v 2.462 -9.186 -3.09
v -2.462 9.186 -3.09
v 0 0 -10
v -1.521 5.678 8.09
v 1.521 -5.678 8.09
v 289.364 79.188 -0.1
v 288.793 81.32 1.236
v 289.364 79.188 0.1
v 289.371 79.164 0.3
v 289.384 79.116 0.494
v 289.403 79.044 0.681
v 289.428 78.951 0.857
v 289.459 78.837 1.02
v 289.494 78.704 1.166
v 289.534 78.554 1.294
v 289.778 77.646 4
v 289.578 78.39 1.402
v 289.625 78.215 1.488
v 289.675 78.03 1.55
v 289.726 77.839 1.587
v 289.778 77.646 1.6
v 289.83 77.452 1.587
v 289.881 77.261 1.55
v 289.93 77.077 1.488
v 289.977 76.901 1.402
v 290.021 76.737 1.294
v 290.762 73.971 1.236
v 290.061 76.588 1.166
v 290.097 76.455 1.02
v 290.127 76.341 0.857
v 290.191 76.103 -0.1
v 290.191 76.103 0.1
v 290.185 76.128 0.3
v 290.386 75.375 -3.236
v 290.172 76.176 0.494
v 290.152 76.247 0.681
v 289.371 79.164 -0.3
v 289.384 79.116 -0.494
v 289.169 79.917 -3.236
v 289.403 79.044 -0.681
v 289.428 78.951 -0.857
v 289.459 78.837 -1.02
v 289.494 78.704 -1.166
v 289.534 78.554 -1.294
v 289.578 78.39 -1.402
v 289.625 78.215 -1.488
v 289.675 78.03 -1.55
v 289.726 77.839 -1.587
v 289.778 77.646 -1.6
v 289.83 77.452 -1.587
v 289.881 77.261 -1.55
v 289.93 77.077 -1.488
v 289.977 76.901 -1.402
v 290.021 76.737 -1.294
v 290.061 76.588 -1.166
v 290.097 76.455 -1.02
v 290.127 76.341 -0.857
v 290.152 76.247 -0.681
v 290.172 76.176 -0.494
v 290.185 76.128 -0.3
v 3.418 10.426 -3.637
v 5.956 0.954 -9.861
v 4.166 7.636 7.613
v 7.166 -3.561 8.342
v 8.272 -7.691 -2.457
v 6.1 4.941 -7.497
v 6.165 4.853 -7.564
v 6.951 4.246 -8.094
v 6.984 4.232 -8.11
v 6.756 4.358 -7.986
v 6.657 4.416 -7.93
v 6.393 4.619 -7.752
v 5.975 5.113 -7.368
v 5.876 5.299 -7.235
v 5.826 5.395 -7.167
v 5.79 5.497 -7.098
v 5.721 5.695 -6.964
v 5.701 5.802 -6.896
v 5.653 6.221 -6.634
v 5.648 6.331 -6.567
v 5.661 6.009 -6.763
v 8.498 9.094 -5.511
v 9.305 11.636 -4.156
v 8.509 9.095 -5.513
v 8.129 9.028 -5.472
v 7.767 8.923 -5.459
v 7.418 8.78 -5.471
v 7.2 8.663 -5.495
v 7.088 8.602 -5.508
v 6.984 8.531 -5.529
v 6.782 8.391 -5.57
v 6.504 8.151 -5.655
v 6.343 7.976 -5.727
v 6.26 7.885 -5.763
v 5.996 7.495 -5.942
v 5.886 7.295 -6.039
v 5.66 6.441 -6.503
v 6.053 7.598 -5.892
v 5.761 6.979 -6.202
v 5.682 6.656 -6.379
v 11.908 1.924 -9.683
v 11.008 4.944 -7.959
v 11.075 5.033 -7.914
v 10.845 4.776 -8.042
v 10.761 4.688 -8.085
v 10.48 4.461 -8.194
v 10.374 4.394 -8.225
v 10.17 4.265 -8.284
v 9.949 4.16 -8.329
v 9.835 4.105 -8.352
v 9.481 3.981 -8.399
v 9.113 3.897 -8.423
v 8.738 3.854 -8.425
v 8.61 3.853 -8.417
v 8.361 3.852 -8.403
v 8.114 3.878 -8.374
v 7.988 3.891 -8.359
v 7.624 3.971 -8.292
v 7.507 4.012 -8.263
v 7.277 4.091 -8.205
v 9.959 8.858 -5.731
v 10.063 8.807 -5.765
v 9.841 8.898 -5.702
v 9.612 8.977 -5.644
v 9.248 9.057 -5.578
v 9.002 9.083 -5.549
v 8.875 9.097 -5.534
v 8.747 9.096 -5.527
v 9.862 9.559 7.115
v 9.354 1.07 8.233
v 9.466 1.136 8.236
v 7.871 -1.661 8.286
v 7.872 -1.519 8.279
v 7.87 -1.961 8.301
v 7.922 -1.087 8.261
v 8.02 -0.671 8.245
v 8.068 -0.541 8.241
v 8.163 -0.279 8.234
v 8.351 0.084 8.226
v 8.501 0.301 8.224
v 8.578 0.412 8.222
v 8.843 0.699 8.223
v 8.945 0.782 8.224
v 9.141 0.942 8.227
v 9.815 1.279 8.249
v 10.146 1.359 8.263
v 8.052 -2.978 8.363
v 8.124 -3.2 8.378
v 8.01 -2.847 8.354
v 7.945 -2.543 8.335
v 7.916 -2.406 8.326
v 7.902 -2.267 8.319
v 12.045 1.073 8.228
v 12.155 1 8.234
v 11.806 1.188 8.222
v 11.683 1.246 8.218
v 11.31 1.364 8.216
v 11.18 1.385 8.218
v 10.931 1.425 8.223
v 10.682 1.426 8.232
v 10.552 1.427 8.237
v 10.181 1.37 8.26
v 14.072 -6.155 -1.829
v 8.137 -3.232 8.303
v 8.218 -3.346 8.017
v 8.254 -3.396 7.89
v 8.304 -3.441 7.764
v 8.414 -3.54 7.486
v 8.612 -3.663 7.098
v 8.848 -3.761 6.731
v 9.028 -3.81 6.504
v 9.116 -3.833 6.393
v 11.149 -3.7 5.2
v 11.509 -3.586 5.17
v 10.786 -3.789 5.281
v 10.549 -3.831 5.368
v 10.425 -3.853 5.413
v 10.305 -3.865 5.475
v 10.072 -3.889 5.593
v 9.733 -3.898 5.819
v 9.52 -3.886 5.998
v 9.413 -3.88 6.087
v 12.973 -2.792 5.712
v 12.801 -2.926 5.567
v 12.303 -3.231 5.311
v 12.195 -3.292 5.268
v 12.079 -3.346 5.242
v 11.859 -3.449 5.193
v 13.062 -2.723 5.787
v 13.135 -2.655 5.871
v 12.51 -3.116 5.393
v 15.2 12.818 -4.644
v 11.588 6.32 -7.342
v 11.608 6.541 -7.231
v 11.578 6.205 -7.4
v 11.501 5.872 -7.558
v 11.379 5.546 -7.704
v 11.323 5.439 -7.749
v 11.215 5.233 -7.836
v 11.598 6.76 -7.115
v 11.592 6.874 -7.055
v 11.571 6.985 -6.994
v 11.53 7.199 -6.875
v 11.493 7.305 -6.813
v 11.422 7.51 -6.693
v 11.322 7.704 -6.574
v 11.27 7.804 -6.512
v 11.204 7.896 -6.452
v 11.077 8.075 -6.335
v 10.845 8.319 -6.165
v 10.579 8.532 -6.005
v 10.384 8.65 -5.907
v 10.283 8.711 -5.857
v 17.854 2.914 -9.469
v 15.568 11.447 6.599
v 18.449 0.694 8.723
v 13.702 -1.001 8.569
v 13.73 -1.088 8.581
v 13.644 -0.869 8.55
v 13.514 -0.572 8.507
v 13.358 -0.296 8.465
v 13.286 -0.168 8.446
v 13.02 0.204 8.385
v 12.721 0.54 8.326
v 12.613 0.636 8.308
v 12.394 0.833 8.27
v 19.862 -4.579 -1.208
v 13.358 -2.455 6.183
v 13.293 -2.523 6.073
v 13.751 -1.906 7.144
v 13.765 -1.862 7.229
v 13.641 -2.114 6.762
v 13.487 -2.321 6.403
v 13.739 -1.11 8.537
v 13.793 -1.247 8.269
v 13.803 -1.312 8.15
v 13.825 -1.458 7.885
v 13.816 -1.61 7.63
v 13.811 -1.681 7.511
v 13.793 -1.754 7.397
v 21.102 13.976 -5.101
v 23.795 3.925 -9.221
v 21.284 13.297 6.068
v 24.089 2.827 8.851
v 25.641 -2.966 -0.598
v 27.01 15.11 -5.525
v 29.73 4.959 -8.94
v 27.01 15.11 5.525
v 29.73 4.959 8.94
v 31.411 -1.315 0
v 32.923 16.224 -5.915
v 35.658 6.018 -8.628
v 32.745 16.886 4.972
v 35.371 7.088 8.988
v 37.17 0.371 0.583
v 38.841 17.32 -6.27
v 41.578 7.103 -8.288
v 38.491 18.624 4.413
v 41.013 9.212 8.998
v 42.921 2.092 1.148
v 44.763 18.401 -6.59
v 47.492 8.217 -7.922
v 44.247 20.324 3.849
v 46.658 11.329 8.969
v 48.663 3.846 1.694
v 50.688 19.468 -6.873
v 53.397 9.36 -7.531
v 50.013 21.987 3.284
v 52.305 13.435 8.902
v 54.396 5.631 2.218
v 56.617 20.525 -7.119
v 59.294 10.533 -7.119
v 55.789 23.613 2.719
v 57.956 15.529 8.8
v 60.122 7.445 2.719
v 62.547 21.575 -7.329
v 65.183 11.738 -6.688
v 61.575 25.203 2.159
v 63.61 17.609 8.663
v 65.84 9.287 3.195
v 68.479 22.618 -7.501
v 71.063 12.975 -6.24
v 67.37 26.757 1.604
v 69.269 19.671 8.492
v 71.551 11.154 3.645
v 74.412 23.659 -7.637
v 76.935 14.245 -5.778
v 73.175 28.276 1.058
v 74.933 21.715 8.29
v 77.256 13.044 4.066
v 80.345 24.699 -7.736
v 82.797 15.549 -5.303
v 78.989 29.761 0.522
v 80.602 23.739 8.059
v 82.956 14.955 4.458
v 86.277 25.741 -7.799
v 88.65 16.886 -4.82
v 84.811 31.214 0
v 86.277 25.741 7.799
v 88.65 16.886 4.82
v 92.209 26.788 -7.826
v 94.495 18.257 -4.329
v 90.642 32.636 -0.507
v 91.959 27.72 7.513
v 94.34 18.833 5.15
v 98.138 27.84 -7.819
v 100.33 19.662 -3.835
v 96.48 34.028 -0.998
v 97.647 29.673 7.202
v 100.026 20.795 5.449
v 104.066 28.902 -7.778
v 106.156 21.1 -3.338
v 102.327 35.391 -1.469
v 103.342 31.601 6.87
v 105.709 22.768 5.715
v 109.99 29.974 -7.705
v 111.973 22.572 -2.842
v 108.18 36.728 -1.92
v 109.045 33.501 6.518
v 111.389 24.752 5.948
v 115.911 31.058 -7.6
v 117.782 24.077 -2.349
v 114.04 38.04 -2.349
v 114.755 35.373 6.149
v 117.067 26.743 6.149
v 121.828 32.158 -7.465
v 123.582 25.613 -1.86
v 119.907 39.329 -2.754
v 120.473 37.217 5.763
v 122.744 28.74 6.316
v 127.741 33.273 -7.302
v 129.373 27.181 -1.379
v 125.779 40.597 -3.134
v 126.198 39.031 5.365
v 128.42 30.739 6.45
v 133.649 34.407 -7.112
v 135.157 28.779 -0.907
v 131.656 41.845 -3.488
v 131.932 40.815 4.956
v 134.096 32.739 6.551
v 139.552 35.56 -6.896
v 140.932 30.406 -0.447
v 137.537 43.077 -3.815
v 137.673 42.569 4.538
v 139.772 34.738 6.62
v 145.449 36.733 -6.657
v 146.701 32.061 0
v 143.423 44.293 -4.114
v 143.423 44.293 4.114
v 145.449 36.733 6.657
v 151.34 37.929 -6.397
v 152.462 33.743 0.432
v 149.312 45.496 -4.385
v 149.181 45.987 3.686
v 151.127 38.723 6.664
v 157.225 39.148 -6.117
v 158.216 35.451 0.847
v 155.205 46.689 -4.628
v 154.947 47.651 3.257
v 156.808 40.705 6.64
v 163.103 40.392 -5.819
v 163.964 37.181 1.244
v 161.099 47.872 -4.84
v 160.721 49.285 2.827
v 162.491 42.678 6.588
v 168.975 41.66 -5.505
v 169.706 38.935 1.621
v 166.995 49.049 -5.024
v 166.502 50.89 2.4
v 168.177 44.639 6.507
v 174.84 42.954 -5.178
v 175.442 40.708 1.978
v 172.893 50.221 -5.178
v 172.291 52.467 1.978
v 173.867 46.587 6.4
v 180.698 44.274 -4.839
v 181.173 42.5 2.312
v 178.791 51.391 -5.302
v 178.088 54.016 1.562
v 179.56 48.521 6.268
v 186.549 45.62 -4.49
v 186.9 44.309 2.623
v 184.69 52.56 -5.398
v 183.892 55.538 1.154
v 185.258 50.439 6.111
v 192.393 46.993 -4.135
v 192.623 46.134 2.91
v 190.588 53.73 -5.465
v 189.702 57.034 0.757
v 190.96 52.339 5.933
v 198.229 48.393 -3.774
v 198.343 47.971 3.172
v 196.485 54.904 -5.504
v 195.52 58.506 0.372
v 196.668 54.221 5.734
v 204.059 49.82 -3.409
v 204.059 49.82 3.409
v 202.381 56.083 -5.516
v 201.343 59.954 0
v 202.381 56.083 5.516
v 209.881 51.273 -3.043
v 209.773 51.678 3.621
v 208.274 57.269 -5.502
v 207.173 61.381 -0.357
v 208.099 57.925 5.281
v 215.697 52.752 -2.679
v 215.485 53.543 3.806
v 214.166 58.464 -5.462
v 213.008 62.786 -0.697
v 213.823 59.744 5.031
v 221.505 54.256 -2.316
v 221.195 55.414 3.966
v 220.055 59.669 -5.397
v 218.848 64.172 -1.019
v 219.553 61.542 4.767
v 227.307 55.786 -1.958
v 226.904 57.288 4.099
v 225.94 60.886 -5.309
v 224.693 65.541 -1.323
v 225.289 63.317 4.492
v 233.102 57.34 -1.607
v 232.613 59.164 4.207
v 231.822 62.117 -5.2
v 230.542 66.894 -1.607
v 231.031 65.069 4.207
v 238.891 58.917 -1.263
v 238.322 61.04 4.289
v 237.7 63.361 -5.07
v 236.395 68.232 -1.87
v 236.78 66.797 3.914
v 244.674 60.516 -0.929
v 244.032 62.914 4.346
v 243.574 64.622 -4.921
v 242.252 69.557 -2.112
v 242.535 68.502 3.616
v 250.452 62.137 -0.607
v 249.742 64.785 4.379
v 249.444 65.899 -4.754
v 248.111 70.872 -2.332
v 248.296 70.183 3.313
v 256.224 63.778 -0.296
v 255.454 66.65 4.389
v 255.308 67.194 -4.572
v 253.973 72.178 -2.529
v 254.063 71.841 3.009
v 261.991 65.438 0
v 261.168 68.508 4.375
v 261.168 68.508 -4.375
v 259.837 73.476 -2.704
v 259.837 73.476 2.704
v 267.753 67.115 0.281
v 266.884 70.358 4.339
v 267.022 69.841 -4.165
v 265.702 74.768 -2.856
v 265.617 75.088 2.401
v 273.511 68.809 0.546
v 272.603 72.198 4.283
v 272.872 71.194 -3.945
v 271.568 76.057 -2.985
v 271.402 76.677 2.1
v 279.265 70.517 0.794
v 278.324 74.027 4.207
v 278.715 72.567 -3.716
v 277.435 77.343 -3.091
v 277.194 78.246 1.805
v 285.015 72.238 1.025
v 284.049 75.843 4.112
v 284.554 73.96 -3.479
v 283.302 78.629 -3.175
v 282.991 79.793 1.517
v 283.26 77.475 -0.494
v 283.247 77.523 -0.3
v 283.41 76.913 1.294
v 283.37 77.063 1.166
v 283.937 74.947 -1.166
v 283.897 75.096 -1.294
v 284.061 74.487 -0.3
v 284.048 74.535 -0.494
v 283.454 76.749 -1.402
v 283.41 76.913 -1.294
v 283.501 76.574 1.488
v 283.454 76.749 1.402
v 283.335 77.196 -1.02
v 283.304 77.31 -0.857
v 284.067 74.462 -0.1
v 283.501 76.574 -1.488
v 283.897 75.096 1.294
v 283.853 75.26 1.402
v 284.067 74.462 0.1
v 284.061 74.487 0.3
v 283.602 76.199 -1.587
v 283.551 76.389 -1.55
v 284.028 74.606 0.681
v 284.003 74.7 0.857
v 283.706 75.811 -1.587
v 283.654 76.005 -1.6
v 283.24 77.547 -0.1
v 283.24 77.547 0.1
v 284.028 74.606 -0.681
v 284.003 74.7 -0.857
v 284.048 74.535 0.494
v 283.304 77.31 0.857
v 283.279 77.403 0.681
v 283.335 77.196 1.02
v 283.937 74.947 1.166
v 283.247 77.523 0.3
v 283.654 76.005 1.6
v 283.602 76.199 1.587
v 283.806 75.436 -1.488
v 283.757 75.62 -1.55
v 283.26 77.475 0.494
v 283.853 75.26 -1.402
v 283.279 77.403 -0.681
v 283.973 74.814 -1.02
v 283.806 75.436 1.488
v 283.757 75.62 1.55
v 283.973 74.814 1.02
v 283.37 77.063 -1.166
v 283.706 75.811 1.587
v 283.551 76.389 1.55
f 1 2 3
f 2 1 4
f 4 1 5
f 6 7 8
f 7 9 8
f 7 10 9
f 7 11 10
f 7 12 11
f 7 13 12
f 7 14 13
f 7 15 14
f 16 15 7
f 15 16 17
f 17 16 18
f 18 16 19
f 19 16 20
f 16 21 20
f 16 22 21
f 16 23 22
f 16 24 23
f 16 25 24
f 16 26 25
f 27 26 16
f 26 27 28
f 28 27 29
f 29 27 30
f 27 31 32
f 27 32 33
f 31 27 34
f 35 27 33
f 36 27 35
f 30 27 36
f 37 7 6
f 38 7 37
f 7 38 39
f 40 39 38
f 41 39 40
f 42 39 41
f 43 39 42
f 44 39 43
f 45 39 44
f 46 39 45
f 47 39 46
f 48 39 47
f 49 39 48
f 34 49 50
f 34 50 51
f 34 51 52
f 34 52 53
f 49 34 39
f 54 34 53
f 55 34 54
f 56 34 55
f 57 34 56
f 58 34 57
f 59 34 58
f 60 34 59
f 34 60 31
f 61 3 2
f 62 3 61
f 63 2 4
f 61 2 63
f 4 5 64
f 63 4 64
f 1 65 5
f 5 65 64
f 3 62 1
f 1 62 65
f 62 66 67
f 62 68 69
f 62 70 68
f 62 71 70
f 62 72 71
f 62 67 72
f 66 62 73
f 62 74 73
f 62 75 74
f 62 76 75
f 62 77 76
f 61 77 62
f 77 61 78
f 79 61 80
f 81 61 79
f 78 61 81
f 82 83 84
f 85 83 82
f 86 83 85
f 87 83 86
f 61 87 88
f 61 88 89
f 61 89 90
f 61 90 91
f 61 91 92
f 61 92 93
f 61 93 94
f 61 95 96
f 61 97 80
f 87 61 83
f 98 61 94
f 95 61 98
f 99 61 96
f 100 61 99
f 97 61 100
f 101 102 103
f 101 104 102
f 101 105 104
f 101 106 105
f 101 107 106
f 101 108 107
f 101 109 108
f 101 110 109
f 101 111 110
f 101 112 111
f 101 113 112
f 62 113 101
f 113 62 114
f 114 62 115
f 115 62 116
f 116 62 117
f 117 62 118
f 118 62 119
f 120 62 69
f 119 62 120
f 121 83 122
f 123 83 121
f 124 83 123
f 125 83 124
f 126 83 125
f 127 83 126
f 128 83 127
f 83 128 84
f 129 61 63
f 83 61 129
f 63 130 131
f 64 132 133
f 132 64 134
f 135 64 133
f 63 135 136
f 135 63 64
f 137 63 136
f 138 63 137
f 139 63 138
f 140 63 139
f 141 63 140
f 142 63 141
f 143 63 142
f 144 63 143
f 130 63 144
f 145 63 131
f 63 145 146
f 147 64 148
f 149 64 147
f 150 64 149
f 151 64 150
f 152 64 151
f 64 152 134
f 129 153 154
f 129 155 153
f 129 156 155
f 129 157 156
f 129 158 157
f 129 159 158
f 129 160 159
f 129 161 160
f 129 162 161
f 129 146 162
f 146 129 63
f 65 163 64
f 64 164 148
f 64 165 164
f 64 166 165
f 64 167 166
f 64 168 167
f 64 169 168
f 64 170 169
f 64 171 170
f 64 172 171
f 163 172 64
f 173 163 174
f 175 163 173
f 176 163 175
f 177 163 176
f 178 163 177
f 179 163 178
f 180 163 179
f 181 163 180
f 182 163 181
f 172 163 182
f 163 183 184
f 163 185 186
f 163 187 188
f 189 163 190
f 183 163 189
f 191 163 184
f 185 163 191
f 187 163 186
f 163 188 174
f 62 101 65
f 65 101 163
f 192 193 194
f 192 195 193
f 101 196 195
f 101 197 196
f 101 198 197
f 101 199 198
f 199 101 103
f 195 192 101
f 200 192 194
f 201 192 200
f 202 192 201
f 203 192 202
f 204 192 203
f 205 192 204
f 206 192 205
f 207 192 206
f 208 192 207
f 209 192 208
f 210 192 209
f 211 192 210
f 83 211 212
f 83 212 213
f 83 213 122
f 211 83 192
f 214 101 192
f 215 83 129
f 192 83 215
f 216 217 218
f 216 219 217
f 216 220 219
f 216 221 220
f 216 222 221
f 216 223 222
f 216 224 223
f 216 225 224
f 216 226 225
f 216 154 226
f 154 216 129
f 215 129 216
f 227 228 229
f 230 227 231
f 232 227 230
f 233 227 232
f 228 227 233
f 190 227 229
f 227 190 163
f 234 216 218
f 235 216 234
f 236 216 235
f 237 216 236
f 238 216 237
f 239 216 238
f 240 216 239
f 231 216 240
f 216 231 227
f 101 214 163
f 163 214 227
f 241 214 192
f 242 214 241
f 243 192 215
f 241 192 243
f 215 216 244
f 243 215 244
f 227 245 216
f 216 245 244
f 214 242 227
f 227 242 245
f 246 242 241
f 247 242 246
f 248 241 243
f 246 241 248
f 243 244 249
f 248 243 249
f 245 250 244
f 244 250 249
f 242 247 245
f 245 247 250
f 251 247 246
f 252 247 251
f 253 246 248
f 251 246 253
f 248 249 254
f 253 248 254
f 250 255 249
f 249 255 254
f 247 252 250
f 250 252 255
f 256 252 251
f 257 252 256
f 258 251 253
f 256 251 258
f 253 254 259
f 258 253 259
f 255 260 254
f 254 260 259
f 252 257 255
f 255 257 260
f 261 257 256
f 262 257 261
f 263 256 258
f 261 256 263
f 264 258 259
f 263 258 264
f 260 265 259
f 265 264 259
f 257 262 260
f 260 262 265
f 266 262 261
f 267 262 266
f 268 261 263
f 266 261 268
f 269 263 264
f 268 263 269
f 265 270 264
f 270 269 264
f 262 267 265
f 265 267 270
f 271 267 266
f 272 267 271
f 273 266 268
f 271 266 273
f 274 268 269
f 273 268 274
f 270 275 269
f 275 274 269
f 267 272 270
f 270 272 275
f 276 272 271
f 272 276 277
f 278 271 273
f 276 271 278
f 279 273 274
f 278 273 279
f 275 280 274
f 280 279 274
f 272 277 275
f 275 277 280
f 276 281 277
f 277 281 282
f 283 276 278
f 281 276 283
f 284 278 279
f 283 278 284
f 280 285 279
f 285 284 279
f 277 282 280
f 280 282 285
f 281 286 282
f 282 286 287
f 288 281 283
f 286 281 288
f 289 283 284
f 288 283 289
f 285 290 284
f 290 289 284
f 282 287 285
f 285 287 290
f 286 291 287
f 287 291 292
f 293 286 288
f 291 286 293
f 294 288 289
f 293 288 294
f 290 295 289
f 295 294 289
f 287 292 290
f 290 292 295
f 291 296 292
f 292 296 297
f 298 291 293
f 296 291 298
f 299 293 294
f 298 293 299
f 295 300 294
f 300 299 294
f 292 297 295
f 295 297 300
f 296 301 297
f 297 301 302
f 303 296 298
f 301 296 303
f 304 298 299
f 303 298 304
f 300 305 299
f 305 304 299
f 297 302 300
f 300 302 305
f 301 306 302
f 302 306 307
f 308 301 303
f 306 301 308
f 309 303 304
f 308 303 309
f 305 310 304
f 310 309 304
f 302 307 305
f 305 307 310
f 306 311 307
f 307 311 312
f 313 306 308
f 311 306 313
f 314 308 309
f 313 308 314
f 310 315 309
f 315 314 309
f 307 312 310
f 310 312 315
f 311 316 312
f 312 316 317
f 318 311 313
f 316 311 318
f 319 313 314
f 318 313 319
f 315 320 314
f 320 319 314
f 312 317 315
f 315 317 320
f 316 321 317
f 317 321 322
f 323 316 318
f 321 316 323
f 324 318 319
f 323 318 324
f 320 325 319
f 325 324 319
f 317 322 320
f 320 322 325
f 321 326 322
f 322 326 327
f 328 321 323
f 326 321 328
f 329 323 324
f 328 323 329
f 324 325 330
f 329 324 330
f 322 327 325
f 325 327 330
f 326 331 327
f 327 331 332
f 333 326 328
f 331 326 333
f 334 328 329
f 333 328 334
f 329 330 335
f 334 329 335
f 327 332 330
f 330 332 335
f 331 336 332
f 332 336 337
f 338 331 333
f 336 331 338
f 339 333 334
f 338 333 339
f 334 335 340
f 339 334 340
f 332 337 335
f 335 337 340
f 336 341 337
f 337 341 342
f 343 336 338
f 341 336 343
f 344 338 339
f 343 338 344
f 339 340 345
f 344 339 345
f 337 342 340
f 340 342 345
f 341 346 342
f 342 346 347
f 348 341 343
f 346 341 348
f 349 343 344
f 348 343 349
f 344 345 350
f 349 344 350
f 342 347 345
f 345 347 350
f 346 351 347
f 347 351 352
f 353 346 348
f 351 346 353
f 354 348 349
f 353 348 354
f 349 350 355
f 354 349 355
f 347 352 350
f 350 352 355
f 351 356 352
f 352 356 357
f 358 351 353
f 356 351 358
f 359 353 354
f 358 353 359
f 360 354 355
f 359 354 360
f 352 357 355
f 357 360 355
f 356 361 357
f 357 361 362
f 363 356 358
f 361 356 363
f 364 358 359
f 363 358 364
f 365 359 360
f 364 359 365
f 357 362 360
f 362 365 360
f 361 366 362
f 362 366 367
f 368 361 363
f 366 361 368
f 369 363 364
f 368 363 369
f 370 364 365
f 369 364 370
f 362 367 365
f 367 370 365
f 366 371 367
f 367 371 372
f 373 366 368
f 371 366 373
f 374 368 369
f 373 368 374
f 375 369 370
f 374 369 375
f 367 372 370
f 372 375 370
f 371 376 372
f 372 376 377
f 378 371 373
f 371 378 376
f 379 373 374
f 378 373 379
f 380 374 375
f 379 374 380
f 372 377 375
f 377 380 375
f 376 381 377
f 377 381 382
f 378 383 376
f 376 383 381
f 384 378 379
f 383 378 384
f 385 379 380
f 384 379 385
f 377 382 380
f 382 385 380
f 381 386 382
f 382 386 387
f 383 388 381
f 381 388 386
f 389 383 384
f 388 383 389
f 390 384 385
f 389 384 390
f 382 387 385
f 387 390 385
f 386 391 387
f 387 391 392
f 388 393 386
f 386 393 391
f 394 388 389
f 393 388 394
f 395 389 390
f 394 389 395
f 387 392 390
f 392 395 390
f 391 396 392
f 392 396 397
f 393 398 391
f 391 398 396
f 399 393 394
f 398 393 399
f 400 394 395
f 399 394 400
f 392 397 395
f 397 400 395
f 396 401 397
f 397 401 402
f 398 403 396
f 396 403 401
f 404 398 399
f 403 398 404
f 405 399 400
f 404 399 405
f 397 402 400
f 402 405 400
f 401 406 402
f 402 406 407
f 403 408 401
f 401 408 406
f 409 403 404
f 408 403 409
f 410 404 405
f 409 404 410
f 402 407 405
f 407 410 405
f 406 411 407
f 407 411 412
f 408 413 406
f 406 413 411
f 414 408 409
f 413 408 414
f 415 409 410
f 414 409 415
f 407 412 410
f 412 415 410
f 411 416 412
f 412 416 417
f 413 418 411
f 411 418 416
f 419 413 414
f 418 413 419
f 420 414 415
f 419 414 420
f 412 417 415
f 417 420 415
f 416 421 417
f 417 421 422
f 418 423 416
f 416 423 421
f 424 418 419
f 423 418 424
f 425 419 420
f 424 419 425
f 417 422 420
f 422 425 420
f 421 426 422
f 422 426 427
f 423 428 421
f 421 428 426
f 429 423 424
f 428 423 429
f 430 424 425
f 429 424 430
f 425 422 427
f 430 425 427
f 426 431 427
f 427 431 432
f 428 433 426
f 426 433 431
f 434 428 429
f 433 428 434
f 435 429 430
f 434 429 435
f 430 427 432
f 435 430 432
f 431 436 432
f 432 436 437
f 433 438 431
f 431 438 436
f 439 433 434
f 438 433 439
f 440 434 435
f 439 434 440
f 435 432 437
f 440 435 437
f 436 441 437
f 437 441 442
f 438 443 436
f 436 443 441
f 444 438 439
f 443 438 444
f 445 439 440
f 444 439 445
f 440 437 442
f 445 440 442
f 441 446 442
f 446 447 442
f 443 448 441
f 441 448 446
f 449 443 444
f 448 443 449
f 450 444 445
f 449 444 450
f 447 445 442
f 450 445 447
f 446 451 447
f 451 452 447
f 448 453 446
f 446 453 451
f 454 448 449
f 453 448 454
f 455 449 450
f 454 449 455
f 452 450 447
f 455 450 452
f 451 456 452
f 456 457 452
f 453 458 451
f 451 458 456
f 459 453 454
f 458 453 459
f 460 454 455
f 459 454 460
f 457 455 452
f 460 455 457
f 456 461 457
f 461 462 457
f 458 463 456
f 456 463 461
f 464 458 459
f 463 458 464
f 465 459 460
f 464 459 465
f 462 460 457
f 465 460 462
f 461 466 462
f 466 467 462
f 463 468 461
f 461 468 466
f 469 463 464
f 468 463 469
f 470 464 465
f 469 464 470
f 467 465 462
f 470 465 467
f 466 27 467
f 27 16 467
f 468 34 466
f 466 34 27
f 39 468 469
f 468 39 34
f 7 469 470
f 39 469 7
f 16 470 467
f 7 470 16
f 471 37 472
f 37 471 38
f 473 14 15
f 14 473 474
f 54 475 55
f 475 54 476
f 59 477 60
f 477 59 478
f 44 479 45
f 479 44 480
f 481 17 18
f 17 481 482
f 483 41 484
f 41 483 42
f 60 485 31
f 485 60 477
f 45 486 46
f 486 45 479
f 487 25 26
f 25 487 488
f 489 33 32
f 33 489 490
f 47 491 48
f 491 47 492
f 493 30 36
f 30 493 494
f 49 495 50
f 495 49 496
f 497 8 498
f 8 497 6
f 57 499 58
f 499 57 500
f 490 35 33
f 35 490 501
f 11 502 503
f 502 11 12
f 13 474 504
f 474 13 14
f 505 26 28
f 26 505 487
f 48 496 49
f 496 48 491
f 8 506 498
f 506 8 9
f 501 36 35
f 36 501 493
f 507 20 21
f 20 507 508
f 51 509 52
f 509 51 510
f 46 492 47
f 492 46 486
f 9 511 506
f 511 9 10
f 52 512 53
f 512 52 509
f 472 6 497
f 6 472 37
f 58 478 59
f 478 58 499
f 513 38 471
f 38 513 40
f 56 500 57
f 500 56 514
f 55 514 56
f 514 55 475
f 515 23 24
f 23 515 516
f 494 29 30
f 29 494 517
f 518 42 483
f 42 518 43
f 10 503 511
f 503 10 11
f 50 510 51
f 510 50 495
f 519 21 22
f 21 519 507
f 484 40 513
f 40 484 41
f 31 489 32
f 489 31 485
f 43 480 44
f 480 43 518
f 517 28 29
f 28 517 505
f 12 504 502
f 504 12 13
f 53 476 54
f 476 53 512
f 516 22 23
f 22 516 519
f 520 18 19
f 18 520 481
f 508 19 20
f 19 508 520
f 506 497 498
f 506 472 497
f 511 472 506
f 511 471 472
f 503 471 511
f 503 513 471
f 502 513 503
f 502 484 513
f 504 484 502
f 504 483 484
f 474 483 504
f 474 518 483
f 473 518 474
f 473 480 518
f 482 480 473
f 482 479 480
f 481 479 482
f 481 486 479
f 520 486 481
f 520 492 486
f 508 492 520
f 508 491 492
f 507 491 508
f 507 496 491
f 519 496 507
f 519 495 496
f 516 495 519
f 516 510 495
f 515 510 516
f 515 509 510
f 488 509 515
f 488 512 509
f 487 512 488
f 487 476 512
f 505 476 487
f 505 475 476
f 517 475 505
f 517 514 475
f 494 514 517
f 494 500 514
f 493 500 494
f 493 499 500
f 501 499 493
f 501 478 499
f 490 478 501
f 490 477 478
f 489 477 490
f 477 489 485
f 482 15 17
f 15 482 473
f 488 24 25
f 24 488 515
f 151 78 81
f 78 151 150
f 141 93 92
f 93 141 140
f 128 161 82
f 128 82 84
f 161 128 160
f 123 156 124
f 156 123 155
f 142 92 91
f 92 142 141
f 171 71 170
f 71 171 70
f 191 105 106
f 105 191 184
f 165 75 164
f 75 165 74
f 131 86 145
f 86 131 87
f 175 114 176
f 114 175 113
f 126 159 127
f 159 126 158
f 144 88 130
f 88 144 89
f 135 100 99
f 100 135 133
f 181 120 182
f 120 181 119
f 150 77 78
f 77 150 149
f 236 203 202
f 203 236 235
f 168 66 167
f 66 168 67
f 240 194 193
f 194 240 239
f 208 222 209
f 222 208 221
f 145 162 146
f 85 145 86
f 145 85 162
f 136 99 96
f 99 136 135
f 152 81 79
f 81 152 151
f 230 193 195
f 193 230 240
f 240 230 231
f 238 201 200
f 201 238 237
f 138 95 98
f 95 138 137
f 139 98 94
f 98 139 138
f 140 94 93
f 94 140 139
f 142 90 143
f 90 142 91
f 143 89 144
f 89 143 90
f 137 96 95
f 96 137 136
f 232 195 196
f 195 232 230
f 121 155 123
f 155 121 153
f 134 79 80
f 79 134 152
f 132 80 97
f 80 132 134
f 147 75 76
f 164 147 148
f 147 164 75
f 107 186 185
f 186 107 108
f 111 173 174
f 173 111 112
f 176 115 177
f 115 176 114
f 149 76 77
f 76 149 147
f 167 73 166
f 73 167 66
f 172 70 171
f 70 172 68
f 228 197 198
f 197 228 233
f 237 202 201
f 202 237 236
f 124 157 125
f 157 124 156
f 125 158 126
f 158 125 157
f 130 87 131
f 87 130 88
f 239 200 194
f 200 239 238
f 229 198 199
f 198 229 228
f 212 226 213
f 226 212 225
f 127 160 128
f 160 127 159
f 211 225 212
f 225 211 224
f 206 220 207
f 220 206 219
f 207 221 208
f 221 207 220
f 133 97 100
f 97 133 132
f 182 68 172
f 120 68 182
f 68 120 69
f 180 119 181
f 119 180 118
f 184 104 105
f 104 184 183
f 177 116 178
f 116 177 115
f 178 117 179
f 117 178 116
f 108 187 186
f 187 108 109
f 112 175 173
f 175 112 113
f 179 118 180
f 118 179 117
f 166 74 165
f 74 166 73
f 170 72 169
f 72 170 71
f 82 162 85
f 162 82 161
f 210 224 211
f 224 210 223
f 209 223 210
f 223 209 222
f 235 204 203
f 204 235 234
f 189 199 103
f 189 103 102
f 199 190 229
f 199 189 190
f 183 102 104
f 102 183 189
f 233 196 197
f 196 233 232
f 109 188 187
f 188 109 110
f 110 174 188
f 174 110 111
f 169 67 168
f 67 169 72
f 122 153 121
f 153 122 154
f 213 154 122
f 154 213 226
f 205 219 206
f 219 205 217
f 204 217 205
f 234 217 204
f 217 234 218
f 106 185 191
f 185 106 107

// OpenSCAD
module regular_polygon(order=5, r=10){
     angles=[ for (i = [0:order-1]) i*(360/order) ];
     coords=[ for (th=angles) [r*cos(th), r*sin(th)] ];
     polygon(coords);
 }

rotate(a = [0, 90, 15])
difference()
{
    linear_extrude(height = 300, center = false, convexity = 10, twist = 180, slices = 50, scale = 0.4, $fn = 50)
    {
        regular_polygon();
    }
    // Magnet hole
    translate(v = [0, 0, 300 - 6.35 + 0.01])
        #cylinder(r = 1.6, h = 6.35, $fn = 50);
    // Tag hole
    rotate(a = [0, 0, 30])
        translate(v = [-25, 0, 10])
            rotate(a = [0, 90, 0])
                cylinder(r = 3, h = 50, $fn = 50);
}
